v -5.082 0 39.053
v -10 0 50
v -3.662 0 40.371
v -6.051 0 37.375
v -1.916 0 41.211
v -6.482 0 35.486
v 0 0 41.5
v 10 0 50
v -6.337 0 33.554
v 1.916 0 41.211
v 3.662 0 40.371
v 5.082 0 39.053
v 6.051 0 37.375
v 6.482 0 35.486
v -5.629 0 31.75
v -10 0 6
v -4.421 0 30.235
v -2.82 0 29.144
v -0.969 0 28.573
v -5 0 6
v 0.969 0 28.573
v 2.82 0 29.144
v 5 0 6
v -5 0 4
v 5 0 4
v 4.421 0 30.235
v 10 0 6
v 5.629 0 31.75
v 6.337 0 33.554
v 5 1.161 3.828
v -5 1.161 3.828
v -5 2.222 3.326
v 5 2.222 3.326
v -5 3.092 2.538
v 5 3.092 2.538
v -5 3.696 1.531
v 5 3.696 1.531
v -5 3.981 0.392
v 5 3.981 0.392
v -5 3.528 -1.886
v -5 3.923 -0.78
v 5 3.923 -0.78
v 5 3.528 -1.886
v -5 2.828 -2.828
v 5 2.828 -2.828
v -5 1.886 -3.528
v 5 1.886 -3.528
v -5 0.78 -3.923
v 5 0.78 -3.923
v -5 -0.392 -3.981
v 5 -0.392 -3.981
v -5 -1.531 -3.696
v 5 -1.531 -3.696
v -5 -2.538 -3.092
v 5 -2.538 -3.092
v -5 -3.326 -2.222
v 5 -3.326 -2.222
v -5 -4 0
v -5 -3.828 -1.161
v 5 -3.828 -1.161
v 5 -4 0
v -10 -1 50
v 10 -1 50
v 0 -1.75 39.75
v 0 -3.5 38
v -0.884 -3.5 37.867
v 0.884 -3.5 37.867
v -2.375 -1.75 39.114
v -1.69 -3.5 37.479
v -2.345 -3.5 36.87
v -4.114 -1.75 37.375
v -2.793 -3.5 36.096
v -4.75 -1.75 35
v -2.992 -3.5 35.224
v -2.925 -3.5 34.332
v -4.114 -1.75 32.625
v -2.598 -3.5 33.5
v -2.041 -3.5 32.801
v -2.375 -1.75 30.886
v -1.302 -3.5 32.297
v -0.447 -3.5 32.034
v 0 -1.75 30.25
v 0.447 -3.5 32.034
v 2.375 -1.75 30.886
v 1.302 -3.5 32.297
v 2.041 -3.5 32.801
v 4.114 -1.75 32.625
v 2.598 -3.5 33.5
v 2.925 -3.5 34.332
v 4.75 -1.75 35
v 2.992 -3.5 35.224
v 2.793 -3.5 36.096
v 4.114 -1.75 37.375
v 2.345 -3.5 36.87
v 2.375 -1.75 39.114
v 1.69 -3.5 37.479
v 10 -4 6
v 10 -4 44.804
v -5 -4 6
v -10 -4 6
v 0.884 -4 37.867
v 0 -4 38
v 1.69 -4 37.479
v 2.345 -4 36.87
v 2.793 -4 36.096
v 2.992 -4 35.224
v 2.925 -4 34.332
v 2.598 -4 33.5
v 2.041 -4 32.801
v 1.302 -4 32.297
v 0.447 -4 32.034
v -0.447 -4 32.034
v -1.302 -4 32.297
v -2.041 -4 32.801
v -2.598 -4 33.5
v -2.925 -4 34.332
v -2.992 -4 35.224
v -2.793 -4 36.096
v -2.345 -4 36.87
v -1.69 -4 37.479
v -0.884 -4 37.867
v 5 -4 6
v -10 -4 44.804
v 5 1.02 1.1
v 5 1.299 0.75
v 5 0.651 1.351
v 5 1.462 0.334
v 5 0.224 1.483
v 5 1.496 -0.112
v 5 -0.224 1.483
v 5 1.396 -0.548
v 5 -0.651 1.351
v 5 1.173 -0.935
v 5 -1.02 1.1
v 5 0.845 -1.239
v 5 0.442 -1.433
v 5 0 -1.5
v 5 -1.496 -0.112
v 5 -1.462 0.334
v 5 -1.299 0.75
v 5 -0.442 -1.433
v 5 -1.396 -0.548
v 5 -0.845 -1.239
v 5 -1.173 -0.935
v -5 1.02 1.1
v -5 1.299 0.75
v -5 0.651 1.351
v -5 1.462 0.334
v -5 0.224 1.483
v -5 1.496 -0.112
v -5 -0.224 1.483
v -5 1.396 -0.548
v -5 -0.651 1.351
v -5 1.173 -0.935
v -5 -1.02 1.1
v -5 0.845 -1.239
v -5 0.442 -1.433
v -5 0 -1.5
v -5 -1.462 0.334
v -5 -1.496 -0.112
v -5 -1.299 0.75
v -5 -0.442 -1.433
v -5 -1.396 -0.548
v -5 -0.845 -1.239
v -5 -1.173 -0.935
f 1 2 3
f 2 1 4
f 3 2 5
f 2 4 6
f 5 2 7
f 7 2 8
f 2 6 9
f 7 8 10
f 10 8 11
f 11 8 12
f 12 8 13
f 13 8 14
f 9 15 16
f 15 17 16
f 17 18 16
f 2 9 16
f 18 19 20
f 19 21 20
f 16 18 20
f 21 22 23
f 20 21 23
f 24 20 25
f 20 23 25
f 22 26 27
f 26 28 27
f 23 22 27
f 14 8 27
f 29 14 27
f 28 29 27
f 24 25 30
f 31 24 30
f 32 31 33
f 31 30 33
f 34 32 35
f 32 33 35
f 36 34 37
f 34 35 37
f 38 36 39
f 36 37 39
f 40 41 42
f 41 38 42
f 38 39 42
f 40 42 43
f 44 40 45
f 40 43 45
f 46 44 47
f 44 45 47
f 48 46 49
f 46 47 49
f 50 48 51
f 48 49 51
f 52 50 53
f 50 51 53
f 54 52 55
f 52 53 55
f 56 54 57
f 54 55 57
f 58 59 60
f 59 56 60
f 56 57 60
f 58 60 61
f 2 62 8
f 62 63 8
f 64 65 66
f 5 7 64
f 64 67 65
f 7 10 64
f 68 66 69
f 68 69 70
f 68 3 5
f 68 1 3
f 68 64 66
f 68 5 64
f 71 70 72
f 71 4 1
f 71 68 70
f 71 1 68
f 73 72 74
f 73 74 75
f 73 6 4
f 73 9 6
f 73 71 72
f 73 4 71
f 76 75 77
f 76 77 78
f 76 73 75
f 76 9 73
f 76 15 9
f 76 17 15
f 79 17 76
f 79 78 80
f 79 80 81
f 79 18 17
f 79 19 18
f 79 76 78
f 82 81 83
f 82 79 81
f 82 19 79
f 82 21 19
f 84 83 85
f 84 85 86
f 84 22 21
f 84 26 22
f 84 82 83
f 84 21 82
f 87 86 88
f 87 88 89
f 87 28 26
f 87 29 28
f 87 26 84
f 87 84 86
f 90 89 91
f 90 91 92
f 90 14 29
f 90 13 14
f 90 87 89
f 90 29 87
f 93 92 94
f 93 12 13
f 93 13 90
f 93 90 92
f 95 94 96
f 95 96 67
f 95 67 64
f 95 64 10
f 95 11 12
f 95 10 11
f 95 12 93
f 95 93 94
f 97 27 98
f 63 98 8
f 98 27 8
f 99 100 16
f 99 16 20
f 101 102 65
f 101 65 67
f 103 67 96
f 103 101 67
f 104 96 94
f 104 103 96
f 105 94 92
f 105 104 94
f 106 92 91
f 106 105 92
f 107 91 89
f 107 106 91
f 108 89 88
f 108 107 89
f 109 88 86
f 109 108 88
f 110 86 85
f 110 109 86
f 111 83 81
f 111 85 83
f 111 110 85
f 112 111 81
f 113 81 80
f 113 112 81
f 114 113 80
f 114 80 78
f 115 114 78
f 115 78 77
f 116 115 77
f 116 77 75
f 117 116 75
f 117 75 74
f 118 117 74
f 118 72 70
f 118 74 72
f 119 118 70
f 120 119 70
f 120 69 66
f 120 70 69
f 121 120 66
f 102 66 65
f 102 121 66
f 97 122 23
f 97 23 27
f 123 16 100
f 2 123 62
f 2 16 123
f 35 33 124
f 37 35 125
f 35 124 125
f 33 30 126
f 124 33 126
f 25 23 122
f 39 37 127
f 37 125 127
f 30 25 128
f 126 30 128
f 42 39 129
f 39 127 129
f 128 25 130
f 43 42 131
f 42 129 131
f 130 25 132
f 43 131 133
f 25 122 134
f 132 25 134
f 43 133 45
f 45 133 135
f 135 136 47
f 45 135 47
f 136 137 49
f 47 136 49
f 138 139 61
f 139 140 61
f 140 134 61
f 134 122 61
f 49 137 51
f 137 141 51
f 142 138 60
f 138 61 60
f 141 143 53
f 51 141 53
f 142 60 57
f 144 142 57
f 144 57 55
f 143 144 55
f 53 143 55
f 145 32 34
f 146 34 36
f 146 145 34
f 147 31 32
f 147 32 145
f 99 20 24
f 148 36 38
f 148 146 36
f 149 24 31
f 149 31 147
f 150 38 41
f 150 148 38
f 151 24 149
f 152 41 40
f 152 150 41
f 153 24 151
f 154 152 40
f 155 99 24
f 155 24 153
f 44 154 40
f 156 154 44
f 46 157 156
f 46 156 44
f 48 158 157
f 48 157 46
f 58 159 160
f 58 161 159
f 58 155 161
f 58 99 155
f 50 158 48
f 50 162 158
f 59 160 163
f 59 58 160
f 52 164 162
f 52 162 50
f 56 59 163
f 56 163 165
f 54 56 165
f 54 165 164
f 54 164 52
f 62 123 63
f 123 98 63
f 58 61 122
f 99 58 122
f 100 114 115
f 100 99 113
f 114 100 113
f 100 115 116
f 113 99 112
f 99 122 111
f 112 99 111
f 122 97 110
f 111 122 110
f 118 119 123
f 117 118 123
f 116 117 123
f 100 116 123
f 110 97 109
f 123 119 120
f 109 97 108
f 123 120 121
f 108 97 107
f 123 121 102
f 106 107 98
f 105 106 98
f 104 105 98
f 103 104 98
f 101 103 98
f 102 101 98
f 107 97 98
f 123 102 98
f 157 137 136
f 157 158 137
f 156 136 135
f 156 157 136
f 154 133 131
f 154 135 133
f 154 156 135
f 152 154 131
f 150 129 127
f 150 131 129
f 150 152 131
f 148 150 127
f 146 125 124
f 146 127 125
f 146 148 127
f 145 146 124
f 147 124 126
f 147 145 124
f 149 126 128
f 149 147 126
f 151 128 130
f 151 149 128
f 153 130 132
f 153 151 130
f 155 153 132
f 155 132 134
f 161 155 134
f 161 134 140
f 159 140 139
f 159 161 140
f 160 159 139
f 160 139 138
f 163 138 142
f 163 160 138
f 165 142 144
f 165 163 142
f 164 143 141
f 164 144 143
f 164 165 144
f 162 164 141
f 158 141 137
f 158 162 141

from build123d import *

# Parameters (mm, degrees)
SKETCH_1_R               = 1.5
EXTRUDE_1_DEPTH          = 10
CUT_EXTRUDE_1_DEPTH      = 52.14684741
CUT_EXTRUDE_1_DEPTH_BACK = 52.14684741
SKETCH_3_R               = 3
SKETCH_3_W               = 5
SKETCH_3_H               = 10
CHAMFER_1_SIZE           = 3.5


with BuildPart() as part:
    # 草图1 → 凸台-拉伸1 (new, symmetric)
    with BuildSketch(Plane(origin=(0, 0, 0), x_dir=(0, 0, -1), z_dir=(1, 0, 0))):
        with BuildLine():
            Line((0, -4), (-44.803847577, -4))
            Line((-44.803847577, -4), (-50, -1))
            Line((-50, -1), (-50, 0))
            Line((-50, 0), (-4, 0))
            ThreePointArc((-4, 0), (2.828427125, 2.828427125), (0, -4))
        make_face()
        Circle(SKETCH_1_R, mode=Mode.SUBTRACT)
    extrude(amount=EXTRUDE_1_DEPTH, both=True)

    # 草图3 → 切除-拉伸1 (cut, two sides: drawn at the far end of the back side and taken through both)
    with BuildSketch(Plane(origin=(0, 0, 0), x_dir=(1, 0, 0), z_dir=(0, 1, 0)).offset(-CUT_EXTRUDE_1_DEPTH_BACK)):
        with Locations(Location((0, -35, 0), (0, 0, 270))):
            Circle(SKETCH_3_R)
        with Locations((-7.5, -1)):
            Rectangle(SKETCH_3_W, SKETCH_3_H)
        with Locations((7.5, -1)):
            Rectangle(SKETCH_3_W, SKETCH_3_H)
    extrude(amount=CUT_EXTRUDE_1_DEPTH + CUT_EXTRUDE_1_DEPTH_BACK, mode=Mode.SUBTRACT)

    # 倒角1
    chamfer_1_edges = [part.edges().sort_by_distance(p)[0] for p in [
        (0, 0, 32),
    ]]
    chamfer(chamfer_1_edges, length=CHAMFER_1_SIZE)


solid = part.part
